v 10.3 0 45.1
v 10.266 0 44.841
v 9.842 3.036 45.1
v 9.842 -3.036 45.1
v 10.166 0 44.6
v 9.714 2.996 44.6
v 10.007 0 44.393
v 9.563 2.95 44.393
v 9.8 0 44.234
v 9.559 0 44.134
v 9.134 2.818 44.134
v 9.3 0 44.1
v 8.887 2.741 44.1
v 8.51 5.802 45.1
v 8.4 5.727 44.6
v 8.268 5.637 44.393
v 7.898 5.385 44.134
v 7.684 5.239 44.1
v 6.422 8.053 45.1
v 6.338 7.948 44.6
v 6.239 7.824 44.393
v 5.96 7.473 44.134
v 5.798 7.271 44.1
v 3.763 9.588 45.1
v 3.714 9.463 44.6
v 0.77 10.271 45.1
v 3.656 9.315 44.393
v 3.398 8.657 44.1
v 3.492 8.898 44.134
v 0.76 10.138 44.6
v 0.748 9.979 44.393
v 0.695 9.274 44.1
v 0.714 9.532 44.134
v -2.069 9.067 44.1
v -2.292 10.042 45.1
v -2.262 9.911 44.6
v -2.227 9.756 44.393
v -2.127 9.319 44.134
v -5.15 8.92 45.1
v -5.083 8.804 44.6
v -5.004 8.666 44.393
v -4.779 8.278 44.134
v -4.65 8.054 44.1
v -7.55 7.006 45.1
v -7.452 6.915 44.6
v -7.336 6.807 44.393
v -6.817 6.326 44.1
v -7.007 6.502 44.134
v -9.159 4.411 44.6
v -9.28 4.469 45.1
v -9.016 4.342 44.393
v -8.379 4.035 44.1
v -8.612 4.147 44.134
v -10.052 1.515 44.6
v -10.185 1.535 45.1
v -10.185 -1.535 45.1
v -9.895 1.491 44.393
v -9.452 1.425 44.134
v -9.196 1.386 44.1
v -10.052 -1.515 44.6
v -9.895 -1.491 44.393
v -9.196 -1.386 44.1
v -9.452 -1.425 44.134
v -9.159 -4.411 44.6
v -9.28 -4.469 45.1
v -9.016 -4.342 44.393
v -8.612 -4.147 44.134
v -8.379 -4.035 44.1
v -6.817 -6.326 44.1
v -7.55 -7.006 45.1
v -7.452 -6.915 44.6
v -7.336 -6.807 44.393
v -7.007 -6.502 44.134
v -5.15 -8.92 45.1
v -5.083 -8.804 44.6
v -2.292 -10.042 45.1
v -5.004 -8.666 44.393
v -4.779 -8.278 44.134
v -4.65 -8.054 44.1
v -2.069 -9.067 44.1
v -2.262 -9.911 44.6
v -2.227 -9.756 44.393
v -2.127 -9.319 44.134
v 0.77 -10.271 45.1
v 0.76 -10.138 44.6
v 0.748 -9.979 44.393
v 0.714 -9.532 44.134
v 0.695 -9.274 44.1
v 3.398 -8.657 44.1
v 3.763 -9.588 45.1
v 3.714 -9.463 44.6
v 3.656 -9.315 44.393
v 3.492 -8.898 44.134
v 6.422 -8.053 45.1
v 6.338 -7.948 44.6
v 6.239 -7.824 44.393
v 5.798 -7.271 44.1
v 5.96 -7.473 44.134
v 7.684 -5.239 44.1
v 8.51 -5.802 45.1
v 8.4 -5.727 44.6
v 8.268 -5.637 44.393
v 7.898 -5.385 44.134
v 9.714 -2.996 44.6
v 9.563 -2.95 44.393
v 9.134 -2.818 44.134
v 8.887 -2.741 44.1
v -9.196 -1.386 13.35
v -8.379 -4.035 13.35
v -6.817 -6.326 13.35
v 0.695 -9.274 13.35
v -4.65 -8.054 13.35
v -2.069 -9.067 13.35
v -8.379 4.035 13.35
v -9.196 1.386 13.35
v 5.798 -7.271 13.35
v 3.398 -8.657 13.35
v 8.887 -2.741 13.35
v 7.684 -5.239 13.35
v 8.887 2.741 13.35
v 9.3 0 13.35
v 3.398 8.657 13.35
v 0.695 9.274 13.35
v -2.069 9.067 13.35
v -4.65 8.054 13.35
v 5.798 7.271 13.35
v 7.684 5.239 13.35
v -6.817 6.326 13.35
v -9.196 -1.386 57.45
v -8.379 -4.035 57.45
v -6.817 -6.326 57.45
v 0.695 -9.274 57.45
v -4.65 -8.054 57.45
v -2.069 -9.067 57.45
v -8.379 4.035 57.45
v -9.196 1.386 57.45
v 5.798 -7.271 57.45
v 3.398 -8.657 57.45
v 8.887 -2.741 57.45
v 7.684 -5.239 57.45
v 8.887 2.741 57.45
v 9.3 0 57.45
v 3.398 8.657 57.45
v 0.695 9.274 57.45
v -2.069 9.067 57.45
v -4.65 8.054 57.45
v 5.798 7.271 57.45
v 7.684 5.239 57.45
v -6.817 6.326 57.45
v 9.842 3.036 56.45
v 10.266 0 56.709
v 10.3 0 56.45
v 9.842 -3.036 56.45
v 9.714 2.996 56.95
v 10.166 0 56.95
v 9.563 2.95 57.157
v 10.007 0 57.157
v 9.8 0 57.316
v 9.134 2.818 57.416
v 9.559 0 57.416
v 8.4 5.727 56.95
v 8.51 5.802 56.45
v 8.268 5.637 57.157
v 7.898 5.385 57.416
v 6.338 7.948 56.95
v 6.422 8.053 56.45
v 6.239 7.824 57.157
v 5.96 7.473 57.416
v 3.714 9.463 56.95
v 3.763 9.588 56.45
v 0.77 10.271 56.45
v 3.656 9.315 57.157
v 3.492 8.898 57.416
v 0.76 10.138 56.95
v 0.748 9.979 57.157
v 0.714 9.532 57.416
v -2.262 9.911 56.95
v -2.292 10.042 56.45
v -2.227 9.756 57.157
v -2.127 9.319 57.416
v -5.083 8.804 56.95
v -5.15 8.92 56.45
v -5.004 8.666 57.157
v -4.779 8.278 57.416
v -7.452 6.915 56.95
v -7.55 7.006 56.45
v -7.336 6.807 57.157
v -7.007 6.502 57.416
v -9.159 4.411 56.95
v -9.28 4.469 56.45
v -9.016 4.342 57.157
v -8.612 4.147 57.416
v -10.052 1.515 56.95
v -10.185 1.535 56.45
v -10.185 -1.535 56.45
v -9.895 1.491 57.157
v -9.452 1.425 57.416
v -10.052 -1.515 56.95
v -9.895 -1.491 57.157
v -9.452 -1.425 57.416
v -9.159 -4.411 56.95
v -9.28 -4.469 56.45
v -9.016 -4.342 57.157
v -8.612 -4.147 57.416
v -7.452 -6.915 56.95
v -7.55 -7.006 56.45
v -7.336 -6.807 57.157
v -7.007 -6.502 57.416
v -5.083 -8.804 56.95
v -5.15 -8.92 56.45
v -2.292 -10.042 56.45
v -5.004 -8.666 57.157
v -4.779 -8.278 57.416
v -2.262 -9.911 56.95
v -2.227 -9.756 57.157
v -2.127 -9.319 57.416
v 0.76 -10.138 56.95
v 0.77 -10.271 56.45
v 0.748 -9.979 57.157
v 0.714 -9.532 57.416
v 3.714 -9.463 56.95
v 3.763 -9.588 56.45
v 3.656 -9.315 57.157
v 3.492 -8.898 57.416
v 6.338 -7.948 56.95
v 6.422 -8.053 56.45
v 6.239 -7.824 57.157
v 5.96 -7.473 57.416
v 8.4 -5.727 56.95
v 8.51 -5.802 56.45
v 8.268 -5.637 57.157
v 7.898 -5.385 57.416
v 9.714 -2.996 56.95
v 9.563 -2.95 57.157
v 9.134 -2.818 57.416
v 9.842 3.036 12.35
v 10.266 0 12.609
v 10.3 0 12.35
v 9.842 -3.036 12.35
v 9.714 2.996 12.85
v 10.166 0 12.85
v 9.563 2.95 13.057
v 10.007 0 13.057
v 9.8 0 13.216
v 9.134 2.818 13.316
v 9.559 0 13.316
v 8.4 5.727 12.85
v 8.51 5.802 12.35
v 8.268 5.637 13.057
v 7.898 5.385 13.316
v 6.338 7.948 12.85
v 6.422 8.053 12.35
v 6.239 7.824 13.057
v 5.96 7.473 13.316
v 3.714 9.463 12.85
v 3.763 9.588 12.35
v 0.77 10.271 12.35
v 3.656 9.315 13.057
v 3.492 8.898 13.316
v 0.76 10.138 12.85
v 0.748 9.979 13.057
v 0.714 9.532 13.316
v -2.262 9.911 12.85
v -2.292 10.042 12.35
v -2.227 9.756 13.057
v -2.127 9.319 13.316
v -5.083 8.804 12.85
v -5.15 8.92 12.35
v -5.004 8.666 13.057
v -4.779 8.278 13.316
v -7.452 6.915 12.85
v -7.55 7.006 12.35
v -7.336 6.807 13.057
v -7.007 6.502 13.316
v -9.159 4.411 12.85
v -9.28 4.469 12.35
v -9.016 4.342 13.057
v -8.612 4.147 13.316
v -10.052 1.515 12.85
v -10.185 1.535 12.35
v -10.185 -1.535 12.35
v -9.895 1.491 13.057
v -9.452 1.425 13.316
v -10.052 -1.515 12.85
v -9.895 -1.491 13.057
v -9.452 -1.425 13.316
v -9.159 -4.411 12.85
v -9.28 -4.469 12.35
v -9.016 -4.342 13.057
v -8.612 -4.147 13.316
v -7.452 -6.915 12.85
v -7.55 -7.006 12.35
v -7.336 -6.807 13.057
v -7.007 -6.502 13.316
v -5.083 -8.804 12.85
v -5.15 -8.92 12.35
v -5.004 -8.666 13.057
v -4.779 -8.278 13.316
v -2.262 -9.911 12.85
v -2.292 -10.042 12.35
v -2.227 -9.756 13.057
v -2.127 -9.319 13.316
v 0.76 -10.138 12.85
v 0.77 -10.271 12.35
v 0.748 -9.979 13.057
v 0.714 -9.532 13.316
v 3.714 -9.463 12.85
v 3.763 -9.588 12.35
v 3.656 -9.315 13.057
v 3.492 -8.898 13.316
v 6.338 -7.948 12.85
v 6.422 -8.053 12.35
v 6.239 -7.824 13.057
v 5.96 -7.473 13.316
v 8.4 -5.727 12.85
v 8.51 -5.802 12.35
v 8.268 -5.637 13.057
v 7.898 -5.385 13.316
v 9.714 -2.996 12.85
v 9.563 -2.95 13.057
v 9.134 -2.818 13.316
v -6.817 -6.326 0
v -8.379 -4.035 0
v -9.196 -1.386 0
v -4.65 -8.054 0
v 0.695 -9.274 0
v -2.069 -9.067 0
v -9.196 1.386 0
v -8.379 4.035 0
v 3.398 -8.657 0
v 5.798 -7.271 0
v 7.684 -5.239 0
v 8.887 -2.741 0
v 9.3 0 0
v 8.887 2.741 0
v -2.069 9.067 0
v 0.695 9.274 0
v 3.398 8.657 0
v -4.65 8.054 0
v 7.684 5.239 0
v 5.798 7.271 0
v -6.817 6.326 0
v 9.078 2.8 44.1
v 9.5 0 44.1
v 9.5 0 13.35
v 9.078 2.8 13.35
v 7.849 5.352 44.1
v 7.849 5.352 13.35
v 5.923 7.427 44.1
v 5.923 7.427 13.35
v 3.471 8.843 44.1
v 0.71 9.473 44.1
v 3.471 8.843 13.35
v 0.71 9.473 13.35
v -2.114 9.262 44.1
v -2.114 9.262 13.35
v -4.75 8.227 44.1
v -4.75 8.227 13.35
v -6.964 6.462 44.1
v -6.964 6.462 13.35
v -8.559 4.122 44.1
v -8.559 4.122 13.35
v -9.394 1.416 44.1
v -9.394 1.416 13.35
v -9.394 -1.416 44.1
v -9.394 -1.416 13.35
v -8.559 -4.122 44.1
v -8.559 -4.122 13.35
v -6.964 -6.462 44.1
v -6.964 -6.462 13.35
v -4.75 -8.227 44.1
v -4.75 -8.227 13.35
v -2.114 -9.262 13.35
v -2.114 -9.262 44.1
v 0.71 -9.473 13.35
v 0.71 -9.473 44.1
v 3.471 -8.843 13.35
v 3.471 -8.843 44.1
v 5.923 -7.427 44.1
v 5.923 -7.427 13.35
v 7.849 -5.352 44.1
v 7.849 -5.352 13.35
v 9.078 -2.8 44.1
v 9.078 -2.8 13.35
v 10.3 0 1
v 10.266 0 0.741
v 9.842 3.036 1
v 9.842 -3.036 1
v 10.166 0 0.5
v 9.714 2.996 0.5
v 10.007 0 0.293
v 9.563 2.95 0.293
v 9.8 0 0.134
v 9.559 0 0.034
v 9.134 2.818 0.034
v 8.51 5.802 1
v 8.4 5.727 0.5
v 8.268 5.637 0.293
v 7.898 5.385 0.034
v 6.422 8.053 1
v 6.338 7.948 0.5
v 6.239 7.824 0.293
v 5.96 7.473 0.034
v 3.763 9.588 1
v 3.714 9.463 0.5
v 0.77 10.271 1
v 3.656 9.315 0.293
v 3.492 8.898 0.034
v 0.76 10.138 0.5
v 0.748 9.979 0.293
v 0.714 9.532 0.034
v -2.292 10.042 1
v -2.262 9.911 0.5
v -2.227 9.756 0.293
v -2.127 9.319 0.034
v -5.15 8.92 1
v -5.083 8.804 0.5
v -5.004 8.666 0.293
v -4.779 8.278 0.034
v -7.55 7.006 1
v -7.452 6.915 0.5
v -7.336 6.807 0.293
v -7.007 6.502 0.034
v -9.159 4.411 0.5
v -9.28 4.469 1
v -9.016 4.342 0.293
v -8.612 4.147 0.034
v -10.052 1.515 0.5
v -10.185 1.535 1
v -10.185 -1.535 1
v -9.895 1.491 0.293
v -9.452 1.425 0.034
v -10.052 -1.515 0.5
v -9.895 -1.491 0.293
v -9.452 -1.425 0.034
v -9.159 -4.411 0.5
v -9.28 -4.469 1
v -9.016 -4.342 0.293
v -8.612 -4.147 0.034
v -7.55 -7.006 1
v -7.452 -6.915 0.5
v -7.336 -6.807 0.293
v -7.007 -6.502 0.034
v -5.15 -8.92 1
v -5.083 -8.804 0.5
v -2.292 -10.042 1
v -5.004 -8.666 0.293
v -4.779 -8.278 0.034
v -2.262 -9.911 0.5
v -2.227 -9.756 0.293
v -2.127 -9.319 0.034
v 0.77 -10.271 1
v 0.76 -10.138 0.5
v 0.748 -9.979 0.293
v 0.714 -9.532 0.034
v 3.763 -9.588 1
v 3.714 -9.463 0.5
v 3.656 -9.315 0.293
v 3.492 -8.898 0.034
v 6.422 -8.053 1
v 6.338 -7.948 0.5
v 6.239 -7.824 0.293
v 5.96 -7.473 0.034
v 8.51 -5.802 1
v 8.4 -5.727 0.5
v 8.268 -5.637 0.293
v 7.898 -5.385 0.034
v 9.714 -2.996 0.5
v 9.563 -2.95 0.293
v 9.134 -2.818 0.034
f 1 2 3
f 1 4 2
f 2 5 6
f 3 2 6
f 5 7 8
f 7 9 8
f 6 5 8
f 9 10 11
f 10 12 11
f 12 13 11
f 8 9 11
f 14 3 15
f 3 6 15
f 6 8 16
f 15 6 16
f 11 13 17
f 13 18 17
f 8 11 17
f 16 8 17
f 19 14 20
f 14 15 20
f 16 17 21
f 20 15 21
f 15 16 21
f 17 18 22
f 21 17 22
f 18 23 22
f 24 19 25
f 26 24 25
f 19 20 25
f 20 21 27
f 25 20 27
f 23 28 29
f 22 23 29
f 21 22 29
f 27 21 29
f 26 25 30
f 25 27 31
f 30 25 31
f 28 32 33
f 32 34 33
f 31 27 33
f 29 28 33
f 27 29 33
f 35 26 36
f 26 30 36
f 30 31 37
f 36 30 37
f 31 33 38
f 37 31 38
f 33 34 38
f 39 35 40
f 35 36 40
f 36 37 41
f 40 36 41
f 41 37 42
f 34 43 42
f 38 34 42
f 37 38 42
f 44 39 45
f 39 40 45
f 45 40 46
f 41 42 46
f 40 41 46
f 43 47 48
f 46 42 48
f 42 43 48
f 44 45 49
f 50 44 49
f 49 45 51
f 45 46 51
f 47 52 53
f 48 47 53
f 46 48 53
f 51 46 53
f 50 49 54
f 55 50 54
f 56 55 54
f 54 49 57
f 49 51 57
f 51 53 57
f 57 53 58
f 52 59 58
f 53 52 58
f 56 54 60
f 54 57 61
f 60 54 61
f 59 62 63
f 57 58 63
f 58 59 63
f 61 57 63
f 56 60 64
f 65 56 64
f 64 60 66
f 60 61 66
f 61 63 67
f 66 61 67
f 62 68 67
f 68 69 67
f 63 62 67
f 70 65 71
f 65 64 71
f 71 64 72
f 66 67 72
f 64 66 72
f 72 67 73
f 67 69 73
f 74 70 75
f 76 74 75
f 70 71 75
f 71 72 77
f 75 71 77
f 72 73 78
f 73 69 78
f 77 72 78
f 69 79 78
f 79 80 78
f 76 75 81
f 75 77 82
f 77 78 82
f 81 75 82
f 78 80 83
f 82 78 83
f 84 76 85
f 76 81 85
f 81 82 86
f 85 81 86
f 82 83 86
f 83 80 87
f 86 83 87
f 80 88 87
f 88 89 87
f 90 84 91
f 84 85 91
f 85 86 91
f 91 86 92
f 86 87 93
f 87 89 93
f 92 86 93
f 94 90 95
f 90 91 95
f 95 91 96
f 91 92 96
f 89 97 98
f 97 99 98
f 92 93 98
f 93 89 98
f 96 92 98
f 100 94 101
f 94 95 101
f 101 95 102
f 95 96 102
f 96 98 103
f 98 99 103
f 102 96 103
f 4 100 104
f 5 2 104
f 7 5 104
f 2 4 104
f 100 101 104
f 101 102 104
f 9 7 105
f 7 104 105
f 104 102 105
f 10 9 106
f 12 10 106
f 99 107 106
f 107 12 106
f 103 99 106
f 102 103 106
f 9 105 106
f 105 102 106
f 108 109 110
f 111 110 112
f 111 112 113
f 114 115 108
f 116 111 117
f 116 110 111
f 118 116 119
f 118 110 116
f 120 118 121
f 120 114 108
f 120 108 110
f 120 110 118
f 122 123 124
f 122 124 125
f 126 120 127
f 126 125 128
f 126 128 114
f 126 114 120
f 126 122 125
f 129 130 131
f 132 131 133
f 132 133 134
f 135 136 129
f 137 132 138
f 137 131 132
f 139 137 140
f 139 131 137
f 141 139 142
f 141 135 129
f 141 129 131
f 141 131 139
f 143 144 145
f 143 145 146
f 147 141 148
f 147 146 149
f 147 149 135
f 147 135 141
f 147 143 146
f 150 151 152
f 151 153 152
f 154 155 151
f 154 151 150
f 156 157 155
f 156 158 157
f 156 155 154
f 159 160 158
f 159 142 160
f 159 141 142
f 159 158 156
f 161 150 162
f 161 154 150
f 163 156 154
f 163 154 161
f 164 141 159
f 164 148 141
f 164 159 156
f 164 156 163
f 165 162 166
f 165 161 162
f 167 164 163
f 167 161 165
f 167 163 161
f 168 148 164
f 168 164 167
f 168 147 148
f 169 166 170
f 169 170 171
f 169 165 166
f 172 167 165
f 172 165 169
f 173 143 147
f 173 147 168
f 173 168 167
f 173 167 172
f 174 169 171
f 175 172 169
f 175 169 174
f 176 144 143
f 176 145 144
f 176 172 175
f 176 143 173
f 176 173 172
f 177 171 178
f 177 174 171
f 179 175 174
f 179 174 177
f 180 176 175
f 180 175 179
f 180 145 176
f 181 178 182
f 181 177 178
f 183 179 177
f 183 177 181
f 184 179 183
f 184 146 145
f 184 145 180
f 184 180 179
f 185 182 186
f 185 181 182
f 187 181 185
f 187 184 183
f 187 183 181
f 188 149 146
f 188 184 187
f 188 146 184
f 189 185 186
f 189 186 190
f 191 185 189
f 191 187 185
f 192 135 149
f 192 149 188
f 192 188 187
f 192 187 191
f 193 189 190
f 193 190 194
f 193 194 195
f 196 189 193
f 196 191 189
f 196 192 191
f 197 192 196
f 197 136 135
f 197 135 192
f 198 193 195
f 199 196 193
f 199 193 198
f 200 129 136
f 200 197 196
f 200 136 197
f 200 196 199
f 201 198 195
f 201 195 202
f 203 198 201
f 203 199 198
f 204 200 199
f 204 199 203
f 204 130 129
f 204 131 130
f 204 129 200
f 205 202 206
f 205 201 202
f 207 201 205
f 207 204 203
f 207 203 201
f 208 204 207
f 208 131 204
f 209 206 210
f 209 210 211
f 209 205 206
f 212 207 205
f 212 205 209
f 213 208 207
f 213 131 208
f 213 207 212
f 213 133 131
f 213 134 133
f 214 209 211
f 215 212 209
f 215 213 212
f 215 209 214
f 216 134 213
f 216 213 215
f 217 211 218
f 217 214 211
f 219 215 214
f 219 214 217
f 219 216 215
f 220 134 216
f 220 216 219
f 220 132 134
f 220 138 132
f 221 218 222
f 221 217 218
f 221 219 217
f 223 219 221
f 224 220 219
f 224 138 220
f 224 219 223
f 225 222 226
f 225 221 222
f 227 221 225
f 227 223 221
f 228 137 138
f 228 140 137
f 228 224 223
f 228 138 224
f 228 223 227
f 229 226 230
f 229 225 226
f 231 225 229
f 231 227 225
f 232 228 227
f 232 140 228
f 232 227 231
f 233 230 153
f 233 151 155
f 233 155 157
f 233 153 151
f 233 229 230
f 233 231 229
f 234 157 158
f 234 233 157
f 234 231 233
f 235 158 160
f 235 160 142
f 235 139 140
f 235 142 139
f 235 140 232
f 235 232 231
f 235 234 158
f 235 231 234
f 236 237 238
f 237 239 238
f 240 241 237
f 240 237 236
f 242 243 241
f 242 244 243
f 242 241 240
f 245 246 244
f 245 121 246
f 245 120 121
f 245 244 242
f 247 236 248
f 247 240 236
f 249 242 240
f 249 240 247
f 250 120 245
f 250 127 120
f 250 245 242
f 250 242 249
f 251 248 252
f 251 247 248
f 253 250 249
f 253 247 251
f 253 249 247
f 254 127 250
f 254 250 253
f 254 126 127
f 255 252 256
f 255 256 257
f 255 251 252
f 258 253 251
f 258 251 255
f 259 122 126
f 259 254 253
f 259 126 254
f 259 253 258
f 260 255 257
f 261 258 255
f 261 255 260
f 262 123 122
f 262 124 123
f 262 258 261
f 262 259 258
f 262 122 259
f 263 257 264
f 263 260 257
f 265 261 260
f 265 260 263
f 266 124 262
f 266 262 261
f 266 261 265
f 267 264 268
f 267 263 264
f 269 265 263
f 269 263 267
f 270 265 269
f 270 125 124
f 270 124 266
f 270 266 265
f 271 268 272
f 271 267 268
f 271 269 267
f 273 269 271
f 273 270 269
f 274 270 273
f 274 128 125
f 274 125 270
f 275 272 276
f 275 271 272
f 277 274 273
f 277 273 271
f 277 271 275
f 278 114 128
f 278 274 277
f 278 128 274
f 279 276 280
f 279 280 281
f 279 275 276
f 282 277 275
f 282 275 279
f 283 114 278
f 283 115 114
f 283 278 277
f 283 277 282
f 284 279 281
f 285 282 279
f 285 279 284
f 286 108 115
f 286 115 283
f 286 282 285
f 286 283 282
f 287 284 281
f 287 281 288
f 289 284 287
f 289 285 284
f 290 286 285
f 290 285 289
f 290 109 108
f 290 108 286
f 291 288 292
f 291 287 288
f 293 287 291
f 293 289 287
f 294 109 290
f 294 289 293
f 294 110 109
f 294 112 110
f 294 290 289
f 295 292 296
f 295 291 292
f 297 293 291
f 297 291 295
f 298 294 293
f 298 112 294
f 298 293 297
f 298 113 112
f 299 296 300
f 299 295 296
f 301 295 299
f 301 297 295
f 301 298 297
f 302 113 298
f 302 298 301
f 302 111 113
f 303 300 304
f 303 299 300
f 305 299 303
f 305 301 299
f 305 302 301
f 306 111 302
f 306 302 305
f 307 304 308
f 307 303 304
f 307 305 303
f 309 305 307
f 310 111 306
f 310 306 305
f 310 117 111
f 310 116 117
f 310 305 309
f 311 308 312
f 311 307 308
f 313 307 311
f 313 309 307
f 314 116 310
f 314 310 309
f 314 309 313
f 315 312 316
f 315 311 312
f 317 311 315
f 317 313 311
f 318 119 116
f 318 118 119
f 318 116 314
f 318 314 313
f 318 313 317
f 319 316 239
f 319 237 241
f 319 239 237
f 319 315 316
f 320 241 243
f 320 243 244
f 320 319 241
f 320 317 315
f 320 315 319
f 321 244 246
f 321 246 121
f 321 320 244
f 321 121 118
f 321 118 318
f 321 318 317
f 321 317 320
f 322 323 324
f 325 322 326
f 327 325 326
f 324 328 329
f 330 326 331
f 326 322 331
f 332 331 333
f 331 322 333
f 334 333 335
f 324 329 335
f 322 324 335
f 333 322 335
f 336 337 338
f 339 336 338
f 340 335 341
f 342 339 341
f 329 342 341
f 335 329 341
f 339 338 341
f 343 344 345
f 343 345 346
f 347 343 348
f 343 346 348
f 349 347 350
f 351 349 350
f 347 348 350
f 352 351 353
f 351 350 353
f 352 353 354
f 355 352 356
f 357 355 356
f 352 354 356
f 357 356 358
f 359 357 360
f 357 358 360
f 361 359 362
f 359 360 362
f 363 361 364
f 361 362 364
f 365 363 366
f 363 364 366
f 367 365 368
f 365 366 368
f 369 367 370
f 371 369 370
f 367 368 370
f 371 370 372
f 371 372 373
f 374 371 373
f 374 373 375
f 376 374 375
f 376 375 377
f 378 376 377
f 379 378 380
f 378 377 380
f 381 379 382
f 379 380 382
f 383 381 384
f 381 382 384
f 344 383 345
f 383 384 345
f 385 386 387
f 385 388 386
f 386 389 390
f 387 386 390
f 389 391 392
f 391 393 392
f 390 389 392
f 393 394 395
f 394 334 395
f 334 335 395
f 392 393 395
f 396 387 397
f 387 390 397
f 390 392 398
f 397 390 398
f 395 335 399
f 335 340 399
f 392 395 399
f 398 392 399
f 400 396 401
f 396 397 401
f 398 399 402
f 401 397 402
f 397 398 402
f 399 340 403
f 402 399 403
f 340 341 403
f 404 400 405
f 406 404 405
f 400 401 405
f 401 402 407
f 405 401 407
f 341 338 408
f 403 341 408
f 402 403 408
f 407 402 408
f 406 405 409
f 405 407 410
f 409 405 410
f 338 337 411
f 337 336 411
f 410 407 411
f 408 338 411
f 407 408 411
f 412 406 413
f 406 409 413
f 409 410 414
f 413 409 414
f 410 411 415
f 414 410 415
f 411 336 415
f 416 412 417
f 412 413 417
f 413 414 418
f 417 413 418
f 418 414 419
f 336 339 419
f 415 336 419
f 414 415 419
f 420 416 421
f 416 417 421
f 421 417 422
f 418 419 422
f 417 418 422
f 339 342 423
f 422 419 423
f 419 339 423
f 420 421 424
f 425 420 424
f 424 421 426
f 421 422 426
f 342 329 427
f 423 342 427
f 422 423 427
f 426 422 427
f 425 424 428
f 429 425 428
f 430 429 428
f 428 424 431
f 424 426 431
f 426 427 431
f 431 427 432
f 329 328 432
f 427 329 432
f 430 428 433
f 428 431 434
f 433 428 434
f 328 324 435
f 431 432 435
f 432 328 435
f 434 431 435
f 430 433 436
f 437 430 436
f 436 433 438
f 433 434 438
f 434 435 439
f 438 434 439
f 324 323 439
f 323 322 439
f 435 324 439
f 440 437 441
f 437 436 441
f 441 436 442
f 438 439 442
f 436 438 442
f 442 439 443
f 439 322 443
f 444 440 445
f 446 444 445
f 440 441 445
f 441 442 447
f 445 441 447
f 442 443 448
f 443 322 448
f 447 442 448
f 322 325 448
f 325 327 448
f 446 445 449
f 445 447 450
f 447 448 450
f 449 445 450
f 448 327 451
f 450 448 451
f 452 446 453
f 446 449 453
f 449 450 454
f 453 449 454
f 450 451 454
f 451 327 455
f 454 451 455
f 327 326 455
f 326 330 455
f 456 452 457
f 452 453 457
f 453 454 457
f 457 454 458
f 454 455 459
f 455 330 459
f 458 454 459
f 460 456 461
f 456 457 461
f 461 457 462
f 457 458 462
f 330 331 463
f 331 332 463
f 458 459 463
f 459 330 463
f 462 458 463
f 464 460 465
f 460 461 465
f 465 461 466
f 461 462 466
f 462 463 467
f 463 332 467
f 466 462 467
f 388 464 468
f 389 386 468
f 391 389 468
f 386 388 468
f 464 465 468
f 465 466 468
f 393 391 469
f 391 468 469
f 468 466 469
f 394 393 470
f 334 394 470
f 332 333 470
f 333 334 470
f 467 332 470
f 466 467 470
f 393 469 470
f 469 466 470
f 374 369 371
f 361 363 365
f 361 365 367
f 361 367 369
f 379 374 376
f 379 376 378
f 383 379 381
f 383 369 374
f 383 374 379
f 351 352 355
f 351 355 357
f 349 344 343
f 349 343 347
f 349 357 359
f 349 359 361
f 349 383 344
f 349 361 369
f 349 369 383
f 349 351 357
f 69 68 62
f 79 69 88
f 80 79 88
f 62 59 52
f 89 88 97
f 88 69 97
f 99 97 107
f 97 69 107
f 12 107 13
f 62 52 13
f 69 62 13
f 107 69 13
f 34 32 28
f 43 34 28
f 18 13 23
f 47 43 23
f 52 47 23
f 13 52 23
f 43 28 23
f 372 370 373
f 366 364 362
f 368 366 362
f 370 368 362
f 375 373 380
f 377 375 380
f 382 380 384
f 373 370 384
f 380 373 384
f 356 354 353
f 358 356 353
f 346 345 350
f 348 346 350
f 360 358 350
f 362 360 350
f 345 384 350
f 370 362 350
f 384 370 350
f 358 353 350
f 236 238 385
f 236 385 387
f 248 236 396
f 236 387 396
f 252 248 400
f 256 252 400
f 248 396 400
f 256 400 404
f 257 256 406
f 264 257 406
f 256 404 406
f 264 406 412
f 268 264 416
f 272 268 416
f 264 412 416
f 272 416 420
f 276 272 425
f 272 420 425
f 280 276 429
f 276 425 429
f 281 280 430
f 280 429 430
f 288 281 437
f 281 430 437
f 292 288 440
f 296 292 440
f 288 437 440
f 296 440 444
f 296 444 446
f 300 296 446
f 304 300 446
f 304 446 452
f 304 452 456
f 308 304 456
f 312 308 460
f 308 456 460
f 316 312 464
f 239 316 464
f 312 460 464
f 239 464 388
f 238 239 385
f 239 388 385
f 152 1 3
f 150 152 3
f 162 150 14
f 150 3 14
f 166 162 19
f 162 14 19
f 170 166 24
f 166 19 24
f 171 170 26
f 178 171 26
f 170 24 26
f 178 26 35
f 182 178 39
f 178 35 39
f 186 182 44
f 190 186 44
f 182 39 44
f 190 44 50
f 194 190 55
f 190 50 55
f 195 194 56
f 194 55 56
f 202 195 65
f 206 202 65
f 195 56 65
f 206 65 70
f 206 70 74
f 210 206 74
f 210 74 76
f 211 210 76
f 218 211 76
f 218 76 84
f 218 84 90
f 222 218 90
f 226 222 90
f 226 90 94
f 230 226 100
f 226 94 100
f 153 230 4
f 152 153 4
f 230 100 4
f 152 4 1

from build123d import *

# Parameters (mm, degrees)
F0_R     = 10.3
F1_DEPTH = 13.35
F2_R     = 9.5
F3_DEPTH = 30.75
F4_R     = 10.3
F5_DEPTH = 13.35
F6_R     = 1
F6_2_R   = 1


with BuildPart() as f1:
    # F0 (on Top) → F1 (new body)
    with BuildSketch(Plane.XY):
        Circle(F0_R)
    extrude(amount=F1_DEPTH)

    # F6#2
    f6_2_edges = [f1.edges().sort_by_distance(p)[0] for p in [
        (-10.3, 0, 0),
        (-10.3, 0, 13.35),
    ]]
    fillet(f6_2_edges, radius=F6_2_R)


with BuildPart() as f3:
    # F2 (on face) → F3 (new body)
    with BuildSketch(Plane.XY.offset(13.35)):
        Circle(F2_R)
    extrude(amount=F3_DEPTH)


with BuildPart() as f5:
    # F4 (on face) → F5 (new body)
    with BuildSketch(Plane.XY.offset(44.1)):
        Circle(F4_R)
    extrude(amount=F5_DEPTH)

    # F6
    f6_edges = [f5.edges().sort_by_distance(p)[0] for p in [
        (-10.3, 0, 57.45),
        (-10.3, 0, 44.1),
    ]]
    fillet(f6_edges, radius=F6_R)


solid = Compound([f1.part, f3.part, f5.part])
